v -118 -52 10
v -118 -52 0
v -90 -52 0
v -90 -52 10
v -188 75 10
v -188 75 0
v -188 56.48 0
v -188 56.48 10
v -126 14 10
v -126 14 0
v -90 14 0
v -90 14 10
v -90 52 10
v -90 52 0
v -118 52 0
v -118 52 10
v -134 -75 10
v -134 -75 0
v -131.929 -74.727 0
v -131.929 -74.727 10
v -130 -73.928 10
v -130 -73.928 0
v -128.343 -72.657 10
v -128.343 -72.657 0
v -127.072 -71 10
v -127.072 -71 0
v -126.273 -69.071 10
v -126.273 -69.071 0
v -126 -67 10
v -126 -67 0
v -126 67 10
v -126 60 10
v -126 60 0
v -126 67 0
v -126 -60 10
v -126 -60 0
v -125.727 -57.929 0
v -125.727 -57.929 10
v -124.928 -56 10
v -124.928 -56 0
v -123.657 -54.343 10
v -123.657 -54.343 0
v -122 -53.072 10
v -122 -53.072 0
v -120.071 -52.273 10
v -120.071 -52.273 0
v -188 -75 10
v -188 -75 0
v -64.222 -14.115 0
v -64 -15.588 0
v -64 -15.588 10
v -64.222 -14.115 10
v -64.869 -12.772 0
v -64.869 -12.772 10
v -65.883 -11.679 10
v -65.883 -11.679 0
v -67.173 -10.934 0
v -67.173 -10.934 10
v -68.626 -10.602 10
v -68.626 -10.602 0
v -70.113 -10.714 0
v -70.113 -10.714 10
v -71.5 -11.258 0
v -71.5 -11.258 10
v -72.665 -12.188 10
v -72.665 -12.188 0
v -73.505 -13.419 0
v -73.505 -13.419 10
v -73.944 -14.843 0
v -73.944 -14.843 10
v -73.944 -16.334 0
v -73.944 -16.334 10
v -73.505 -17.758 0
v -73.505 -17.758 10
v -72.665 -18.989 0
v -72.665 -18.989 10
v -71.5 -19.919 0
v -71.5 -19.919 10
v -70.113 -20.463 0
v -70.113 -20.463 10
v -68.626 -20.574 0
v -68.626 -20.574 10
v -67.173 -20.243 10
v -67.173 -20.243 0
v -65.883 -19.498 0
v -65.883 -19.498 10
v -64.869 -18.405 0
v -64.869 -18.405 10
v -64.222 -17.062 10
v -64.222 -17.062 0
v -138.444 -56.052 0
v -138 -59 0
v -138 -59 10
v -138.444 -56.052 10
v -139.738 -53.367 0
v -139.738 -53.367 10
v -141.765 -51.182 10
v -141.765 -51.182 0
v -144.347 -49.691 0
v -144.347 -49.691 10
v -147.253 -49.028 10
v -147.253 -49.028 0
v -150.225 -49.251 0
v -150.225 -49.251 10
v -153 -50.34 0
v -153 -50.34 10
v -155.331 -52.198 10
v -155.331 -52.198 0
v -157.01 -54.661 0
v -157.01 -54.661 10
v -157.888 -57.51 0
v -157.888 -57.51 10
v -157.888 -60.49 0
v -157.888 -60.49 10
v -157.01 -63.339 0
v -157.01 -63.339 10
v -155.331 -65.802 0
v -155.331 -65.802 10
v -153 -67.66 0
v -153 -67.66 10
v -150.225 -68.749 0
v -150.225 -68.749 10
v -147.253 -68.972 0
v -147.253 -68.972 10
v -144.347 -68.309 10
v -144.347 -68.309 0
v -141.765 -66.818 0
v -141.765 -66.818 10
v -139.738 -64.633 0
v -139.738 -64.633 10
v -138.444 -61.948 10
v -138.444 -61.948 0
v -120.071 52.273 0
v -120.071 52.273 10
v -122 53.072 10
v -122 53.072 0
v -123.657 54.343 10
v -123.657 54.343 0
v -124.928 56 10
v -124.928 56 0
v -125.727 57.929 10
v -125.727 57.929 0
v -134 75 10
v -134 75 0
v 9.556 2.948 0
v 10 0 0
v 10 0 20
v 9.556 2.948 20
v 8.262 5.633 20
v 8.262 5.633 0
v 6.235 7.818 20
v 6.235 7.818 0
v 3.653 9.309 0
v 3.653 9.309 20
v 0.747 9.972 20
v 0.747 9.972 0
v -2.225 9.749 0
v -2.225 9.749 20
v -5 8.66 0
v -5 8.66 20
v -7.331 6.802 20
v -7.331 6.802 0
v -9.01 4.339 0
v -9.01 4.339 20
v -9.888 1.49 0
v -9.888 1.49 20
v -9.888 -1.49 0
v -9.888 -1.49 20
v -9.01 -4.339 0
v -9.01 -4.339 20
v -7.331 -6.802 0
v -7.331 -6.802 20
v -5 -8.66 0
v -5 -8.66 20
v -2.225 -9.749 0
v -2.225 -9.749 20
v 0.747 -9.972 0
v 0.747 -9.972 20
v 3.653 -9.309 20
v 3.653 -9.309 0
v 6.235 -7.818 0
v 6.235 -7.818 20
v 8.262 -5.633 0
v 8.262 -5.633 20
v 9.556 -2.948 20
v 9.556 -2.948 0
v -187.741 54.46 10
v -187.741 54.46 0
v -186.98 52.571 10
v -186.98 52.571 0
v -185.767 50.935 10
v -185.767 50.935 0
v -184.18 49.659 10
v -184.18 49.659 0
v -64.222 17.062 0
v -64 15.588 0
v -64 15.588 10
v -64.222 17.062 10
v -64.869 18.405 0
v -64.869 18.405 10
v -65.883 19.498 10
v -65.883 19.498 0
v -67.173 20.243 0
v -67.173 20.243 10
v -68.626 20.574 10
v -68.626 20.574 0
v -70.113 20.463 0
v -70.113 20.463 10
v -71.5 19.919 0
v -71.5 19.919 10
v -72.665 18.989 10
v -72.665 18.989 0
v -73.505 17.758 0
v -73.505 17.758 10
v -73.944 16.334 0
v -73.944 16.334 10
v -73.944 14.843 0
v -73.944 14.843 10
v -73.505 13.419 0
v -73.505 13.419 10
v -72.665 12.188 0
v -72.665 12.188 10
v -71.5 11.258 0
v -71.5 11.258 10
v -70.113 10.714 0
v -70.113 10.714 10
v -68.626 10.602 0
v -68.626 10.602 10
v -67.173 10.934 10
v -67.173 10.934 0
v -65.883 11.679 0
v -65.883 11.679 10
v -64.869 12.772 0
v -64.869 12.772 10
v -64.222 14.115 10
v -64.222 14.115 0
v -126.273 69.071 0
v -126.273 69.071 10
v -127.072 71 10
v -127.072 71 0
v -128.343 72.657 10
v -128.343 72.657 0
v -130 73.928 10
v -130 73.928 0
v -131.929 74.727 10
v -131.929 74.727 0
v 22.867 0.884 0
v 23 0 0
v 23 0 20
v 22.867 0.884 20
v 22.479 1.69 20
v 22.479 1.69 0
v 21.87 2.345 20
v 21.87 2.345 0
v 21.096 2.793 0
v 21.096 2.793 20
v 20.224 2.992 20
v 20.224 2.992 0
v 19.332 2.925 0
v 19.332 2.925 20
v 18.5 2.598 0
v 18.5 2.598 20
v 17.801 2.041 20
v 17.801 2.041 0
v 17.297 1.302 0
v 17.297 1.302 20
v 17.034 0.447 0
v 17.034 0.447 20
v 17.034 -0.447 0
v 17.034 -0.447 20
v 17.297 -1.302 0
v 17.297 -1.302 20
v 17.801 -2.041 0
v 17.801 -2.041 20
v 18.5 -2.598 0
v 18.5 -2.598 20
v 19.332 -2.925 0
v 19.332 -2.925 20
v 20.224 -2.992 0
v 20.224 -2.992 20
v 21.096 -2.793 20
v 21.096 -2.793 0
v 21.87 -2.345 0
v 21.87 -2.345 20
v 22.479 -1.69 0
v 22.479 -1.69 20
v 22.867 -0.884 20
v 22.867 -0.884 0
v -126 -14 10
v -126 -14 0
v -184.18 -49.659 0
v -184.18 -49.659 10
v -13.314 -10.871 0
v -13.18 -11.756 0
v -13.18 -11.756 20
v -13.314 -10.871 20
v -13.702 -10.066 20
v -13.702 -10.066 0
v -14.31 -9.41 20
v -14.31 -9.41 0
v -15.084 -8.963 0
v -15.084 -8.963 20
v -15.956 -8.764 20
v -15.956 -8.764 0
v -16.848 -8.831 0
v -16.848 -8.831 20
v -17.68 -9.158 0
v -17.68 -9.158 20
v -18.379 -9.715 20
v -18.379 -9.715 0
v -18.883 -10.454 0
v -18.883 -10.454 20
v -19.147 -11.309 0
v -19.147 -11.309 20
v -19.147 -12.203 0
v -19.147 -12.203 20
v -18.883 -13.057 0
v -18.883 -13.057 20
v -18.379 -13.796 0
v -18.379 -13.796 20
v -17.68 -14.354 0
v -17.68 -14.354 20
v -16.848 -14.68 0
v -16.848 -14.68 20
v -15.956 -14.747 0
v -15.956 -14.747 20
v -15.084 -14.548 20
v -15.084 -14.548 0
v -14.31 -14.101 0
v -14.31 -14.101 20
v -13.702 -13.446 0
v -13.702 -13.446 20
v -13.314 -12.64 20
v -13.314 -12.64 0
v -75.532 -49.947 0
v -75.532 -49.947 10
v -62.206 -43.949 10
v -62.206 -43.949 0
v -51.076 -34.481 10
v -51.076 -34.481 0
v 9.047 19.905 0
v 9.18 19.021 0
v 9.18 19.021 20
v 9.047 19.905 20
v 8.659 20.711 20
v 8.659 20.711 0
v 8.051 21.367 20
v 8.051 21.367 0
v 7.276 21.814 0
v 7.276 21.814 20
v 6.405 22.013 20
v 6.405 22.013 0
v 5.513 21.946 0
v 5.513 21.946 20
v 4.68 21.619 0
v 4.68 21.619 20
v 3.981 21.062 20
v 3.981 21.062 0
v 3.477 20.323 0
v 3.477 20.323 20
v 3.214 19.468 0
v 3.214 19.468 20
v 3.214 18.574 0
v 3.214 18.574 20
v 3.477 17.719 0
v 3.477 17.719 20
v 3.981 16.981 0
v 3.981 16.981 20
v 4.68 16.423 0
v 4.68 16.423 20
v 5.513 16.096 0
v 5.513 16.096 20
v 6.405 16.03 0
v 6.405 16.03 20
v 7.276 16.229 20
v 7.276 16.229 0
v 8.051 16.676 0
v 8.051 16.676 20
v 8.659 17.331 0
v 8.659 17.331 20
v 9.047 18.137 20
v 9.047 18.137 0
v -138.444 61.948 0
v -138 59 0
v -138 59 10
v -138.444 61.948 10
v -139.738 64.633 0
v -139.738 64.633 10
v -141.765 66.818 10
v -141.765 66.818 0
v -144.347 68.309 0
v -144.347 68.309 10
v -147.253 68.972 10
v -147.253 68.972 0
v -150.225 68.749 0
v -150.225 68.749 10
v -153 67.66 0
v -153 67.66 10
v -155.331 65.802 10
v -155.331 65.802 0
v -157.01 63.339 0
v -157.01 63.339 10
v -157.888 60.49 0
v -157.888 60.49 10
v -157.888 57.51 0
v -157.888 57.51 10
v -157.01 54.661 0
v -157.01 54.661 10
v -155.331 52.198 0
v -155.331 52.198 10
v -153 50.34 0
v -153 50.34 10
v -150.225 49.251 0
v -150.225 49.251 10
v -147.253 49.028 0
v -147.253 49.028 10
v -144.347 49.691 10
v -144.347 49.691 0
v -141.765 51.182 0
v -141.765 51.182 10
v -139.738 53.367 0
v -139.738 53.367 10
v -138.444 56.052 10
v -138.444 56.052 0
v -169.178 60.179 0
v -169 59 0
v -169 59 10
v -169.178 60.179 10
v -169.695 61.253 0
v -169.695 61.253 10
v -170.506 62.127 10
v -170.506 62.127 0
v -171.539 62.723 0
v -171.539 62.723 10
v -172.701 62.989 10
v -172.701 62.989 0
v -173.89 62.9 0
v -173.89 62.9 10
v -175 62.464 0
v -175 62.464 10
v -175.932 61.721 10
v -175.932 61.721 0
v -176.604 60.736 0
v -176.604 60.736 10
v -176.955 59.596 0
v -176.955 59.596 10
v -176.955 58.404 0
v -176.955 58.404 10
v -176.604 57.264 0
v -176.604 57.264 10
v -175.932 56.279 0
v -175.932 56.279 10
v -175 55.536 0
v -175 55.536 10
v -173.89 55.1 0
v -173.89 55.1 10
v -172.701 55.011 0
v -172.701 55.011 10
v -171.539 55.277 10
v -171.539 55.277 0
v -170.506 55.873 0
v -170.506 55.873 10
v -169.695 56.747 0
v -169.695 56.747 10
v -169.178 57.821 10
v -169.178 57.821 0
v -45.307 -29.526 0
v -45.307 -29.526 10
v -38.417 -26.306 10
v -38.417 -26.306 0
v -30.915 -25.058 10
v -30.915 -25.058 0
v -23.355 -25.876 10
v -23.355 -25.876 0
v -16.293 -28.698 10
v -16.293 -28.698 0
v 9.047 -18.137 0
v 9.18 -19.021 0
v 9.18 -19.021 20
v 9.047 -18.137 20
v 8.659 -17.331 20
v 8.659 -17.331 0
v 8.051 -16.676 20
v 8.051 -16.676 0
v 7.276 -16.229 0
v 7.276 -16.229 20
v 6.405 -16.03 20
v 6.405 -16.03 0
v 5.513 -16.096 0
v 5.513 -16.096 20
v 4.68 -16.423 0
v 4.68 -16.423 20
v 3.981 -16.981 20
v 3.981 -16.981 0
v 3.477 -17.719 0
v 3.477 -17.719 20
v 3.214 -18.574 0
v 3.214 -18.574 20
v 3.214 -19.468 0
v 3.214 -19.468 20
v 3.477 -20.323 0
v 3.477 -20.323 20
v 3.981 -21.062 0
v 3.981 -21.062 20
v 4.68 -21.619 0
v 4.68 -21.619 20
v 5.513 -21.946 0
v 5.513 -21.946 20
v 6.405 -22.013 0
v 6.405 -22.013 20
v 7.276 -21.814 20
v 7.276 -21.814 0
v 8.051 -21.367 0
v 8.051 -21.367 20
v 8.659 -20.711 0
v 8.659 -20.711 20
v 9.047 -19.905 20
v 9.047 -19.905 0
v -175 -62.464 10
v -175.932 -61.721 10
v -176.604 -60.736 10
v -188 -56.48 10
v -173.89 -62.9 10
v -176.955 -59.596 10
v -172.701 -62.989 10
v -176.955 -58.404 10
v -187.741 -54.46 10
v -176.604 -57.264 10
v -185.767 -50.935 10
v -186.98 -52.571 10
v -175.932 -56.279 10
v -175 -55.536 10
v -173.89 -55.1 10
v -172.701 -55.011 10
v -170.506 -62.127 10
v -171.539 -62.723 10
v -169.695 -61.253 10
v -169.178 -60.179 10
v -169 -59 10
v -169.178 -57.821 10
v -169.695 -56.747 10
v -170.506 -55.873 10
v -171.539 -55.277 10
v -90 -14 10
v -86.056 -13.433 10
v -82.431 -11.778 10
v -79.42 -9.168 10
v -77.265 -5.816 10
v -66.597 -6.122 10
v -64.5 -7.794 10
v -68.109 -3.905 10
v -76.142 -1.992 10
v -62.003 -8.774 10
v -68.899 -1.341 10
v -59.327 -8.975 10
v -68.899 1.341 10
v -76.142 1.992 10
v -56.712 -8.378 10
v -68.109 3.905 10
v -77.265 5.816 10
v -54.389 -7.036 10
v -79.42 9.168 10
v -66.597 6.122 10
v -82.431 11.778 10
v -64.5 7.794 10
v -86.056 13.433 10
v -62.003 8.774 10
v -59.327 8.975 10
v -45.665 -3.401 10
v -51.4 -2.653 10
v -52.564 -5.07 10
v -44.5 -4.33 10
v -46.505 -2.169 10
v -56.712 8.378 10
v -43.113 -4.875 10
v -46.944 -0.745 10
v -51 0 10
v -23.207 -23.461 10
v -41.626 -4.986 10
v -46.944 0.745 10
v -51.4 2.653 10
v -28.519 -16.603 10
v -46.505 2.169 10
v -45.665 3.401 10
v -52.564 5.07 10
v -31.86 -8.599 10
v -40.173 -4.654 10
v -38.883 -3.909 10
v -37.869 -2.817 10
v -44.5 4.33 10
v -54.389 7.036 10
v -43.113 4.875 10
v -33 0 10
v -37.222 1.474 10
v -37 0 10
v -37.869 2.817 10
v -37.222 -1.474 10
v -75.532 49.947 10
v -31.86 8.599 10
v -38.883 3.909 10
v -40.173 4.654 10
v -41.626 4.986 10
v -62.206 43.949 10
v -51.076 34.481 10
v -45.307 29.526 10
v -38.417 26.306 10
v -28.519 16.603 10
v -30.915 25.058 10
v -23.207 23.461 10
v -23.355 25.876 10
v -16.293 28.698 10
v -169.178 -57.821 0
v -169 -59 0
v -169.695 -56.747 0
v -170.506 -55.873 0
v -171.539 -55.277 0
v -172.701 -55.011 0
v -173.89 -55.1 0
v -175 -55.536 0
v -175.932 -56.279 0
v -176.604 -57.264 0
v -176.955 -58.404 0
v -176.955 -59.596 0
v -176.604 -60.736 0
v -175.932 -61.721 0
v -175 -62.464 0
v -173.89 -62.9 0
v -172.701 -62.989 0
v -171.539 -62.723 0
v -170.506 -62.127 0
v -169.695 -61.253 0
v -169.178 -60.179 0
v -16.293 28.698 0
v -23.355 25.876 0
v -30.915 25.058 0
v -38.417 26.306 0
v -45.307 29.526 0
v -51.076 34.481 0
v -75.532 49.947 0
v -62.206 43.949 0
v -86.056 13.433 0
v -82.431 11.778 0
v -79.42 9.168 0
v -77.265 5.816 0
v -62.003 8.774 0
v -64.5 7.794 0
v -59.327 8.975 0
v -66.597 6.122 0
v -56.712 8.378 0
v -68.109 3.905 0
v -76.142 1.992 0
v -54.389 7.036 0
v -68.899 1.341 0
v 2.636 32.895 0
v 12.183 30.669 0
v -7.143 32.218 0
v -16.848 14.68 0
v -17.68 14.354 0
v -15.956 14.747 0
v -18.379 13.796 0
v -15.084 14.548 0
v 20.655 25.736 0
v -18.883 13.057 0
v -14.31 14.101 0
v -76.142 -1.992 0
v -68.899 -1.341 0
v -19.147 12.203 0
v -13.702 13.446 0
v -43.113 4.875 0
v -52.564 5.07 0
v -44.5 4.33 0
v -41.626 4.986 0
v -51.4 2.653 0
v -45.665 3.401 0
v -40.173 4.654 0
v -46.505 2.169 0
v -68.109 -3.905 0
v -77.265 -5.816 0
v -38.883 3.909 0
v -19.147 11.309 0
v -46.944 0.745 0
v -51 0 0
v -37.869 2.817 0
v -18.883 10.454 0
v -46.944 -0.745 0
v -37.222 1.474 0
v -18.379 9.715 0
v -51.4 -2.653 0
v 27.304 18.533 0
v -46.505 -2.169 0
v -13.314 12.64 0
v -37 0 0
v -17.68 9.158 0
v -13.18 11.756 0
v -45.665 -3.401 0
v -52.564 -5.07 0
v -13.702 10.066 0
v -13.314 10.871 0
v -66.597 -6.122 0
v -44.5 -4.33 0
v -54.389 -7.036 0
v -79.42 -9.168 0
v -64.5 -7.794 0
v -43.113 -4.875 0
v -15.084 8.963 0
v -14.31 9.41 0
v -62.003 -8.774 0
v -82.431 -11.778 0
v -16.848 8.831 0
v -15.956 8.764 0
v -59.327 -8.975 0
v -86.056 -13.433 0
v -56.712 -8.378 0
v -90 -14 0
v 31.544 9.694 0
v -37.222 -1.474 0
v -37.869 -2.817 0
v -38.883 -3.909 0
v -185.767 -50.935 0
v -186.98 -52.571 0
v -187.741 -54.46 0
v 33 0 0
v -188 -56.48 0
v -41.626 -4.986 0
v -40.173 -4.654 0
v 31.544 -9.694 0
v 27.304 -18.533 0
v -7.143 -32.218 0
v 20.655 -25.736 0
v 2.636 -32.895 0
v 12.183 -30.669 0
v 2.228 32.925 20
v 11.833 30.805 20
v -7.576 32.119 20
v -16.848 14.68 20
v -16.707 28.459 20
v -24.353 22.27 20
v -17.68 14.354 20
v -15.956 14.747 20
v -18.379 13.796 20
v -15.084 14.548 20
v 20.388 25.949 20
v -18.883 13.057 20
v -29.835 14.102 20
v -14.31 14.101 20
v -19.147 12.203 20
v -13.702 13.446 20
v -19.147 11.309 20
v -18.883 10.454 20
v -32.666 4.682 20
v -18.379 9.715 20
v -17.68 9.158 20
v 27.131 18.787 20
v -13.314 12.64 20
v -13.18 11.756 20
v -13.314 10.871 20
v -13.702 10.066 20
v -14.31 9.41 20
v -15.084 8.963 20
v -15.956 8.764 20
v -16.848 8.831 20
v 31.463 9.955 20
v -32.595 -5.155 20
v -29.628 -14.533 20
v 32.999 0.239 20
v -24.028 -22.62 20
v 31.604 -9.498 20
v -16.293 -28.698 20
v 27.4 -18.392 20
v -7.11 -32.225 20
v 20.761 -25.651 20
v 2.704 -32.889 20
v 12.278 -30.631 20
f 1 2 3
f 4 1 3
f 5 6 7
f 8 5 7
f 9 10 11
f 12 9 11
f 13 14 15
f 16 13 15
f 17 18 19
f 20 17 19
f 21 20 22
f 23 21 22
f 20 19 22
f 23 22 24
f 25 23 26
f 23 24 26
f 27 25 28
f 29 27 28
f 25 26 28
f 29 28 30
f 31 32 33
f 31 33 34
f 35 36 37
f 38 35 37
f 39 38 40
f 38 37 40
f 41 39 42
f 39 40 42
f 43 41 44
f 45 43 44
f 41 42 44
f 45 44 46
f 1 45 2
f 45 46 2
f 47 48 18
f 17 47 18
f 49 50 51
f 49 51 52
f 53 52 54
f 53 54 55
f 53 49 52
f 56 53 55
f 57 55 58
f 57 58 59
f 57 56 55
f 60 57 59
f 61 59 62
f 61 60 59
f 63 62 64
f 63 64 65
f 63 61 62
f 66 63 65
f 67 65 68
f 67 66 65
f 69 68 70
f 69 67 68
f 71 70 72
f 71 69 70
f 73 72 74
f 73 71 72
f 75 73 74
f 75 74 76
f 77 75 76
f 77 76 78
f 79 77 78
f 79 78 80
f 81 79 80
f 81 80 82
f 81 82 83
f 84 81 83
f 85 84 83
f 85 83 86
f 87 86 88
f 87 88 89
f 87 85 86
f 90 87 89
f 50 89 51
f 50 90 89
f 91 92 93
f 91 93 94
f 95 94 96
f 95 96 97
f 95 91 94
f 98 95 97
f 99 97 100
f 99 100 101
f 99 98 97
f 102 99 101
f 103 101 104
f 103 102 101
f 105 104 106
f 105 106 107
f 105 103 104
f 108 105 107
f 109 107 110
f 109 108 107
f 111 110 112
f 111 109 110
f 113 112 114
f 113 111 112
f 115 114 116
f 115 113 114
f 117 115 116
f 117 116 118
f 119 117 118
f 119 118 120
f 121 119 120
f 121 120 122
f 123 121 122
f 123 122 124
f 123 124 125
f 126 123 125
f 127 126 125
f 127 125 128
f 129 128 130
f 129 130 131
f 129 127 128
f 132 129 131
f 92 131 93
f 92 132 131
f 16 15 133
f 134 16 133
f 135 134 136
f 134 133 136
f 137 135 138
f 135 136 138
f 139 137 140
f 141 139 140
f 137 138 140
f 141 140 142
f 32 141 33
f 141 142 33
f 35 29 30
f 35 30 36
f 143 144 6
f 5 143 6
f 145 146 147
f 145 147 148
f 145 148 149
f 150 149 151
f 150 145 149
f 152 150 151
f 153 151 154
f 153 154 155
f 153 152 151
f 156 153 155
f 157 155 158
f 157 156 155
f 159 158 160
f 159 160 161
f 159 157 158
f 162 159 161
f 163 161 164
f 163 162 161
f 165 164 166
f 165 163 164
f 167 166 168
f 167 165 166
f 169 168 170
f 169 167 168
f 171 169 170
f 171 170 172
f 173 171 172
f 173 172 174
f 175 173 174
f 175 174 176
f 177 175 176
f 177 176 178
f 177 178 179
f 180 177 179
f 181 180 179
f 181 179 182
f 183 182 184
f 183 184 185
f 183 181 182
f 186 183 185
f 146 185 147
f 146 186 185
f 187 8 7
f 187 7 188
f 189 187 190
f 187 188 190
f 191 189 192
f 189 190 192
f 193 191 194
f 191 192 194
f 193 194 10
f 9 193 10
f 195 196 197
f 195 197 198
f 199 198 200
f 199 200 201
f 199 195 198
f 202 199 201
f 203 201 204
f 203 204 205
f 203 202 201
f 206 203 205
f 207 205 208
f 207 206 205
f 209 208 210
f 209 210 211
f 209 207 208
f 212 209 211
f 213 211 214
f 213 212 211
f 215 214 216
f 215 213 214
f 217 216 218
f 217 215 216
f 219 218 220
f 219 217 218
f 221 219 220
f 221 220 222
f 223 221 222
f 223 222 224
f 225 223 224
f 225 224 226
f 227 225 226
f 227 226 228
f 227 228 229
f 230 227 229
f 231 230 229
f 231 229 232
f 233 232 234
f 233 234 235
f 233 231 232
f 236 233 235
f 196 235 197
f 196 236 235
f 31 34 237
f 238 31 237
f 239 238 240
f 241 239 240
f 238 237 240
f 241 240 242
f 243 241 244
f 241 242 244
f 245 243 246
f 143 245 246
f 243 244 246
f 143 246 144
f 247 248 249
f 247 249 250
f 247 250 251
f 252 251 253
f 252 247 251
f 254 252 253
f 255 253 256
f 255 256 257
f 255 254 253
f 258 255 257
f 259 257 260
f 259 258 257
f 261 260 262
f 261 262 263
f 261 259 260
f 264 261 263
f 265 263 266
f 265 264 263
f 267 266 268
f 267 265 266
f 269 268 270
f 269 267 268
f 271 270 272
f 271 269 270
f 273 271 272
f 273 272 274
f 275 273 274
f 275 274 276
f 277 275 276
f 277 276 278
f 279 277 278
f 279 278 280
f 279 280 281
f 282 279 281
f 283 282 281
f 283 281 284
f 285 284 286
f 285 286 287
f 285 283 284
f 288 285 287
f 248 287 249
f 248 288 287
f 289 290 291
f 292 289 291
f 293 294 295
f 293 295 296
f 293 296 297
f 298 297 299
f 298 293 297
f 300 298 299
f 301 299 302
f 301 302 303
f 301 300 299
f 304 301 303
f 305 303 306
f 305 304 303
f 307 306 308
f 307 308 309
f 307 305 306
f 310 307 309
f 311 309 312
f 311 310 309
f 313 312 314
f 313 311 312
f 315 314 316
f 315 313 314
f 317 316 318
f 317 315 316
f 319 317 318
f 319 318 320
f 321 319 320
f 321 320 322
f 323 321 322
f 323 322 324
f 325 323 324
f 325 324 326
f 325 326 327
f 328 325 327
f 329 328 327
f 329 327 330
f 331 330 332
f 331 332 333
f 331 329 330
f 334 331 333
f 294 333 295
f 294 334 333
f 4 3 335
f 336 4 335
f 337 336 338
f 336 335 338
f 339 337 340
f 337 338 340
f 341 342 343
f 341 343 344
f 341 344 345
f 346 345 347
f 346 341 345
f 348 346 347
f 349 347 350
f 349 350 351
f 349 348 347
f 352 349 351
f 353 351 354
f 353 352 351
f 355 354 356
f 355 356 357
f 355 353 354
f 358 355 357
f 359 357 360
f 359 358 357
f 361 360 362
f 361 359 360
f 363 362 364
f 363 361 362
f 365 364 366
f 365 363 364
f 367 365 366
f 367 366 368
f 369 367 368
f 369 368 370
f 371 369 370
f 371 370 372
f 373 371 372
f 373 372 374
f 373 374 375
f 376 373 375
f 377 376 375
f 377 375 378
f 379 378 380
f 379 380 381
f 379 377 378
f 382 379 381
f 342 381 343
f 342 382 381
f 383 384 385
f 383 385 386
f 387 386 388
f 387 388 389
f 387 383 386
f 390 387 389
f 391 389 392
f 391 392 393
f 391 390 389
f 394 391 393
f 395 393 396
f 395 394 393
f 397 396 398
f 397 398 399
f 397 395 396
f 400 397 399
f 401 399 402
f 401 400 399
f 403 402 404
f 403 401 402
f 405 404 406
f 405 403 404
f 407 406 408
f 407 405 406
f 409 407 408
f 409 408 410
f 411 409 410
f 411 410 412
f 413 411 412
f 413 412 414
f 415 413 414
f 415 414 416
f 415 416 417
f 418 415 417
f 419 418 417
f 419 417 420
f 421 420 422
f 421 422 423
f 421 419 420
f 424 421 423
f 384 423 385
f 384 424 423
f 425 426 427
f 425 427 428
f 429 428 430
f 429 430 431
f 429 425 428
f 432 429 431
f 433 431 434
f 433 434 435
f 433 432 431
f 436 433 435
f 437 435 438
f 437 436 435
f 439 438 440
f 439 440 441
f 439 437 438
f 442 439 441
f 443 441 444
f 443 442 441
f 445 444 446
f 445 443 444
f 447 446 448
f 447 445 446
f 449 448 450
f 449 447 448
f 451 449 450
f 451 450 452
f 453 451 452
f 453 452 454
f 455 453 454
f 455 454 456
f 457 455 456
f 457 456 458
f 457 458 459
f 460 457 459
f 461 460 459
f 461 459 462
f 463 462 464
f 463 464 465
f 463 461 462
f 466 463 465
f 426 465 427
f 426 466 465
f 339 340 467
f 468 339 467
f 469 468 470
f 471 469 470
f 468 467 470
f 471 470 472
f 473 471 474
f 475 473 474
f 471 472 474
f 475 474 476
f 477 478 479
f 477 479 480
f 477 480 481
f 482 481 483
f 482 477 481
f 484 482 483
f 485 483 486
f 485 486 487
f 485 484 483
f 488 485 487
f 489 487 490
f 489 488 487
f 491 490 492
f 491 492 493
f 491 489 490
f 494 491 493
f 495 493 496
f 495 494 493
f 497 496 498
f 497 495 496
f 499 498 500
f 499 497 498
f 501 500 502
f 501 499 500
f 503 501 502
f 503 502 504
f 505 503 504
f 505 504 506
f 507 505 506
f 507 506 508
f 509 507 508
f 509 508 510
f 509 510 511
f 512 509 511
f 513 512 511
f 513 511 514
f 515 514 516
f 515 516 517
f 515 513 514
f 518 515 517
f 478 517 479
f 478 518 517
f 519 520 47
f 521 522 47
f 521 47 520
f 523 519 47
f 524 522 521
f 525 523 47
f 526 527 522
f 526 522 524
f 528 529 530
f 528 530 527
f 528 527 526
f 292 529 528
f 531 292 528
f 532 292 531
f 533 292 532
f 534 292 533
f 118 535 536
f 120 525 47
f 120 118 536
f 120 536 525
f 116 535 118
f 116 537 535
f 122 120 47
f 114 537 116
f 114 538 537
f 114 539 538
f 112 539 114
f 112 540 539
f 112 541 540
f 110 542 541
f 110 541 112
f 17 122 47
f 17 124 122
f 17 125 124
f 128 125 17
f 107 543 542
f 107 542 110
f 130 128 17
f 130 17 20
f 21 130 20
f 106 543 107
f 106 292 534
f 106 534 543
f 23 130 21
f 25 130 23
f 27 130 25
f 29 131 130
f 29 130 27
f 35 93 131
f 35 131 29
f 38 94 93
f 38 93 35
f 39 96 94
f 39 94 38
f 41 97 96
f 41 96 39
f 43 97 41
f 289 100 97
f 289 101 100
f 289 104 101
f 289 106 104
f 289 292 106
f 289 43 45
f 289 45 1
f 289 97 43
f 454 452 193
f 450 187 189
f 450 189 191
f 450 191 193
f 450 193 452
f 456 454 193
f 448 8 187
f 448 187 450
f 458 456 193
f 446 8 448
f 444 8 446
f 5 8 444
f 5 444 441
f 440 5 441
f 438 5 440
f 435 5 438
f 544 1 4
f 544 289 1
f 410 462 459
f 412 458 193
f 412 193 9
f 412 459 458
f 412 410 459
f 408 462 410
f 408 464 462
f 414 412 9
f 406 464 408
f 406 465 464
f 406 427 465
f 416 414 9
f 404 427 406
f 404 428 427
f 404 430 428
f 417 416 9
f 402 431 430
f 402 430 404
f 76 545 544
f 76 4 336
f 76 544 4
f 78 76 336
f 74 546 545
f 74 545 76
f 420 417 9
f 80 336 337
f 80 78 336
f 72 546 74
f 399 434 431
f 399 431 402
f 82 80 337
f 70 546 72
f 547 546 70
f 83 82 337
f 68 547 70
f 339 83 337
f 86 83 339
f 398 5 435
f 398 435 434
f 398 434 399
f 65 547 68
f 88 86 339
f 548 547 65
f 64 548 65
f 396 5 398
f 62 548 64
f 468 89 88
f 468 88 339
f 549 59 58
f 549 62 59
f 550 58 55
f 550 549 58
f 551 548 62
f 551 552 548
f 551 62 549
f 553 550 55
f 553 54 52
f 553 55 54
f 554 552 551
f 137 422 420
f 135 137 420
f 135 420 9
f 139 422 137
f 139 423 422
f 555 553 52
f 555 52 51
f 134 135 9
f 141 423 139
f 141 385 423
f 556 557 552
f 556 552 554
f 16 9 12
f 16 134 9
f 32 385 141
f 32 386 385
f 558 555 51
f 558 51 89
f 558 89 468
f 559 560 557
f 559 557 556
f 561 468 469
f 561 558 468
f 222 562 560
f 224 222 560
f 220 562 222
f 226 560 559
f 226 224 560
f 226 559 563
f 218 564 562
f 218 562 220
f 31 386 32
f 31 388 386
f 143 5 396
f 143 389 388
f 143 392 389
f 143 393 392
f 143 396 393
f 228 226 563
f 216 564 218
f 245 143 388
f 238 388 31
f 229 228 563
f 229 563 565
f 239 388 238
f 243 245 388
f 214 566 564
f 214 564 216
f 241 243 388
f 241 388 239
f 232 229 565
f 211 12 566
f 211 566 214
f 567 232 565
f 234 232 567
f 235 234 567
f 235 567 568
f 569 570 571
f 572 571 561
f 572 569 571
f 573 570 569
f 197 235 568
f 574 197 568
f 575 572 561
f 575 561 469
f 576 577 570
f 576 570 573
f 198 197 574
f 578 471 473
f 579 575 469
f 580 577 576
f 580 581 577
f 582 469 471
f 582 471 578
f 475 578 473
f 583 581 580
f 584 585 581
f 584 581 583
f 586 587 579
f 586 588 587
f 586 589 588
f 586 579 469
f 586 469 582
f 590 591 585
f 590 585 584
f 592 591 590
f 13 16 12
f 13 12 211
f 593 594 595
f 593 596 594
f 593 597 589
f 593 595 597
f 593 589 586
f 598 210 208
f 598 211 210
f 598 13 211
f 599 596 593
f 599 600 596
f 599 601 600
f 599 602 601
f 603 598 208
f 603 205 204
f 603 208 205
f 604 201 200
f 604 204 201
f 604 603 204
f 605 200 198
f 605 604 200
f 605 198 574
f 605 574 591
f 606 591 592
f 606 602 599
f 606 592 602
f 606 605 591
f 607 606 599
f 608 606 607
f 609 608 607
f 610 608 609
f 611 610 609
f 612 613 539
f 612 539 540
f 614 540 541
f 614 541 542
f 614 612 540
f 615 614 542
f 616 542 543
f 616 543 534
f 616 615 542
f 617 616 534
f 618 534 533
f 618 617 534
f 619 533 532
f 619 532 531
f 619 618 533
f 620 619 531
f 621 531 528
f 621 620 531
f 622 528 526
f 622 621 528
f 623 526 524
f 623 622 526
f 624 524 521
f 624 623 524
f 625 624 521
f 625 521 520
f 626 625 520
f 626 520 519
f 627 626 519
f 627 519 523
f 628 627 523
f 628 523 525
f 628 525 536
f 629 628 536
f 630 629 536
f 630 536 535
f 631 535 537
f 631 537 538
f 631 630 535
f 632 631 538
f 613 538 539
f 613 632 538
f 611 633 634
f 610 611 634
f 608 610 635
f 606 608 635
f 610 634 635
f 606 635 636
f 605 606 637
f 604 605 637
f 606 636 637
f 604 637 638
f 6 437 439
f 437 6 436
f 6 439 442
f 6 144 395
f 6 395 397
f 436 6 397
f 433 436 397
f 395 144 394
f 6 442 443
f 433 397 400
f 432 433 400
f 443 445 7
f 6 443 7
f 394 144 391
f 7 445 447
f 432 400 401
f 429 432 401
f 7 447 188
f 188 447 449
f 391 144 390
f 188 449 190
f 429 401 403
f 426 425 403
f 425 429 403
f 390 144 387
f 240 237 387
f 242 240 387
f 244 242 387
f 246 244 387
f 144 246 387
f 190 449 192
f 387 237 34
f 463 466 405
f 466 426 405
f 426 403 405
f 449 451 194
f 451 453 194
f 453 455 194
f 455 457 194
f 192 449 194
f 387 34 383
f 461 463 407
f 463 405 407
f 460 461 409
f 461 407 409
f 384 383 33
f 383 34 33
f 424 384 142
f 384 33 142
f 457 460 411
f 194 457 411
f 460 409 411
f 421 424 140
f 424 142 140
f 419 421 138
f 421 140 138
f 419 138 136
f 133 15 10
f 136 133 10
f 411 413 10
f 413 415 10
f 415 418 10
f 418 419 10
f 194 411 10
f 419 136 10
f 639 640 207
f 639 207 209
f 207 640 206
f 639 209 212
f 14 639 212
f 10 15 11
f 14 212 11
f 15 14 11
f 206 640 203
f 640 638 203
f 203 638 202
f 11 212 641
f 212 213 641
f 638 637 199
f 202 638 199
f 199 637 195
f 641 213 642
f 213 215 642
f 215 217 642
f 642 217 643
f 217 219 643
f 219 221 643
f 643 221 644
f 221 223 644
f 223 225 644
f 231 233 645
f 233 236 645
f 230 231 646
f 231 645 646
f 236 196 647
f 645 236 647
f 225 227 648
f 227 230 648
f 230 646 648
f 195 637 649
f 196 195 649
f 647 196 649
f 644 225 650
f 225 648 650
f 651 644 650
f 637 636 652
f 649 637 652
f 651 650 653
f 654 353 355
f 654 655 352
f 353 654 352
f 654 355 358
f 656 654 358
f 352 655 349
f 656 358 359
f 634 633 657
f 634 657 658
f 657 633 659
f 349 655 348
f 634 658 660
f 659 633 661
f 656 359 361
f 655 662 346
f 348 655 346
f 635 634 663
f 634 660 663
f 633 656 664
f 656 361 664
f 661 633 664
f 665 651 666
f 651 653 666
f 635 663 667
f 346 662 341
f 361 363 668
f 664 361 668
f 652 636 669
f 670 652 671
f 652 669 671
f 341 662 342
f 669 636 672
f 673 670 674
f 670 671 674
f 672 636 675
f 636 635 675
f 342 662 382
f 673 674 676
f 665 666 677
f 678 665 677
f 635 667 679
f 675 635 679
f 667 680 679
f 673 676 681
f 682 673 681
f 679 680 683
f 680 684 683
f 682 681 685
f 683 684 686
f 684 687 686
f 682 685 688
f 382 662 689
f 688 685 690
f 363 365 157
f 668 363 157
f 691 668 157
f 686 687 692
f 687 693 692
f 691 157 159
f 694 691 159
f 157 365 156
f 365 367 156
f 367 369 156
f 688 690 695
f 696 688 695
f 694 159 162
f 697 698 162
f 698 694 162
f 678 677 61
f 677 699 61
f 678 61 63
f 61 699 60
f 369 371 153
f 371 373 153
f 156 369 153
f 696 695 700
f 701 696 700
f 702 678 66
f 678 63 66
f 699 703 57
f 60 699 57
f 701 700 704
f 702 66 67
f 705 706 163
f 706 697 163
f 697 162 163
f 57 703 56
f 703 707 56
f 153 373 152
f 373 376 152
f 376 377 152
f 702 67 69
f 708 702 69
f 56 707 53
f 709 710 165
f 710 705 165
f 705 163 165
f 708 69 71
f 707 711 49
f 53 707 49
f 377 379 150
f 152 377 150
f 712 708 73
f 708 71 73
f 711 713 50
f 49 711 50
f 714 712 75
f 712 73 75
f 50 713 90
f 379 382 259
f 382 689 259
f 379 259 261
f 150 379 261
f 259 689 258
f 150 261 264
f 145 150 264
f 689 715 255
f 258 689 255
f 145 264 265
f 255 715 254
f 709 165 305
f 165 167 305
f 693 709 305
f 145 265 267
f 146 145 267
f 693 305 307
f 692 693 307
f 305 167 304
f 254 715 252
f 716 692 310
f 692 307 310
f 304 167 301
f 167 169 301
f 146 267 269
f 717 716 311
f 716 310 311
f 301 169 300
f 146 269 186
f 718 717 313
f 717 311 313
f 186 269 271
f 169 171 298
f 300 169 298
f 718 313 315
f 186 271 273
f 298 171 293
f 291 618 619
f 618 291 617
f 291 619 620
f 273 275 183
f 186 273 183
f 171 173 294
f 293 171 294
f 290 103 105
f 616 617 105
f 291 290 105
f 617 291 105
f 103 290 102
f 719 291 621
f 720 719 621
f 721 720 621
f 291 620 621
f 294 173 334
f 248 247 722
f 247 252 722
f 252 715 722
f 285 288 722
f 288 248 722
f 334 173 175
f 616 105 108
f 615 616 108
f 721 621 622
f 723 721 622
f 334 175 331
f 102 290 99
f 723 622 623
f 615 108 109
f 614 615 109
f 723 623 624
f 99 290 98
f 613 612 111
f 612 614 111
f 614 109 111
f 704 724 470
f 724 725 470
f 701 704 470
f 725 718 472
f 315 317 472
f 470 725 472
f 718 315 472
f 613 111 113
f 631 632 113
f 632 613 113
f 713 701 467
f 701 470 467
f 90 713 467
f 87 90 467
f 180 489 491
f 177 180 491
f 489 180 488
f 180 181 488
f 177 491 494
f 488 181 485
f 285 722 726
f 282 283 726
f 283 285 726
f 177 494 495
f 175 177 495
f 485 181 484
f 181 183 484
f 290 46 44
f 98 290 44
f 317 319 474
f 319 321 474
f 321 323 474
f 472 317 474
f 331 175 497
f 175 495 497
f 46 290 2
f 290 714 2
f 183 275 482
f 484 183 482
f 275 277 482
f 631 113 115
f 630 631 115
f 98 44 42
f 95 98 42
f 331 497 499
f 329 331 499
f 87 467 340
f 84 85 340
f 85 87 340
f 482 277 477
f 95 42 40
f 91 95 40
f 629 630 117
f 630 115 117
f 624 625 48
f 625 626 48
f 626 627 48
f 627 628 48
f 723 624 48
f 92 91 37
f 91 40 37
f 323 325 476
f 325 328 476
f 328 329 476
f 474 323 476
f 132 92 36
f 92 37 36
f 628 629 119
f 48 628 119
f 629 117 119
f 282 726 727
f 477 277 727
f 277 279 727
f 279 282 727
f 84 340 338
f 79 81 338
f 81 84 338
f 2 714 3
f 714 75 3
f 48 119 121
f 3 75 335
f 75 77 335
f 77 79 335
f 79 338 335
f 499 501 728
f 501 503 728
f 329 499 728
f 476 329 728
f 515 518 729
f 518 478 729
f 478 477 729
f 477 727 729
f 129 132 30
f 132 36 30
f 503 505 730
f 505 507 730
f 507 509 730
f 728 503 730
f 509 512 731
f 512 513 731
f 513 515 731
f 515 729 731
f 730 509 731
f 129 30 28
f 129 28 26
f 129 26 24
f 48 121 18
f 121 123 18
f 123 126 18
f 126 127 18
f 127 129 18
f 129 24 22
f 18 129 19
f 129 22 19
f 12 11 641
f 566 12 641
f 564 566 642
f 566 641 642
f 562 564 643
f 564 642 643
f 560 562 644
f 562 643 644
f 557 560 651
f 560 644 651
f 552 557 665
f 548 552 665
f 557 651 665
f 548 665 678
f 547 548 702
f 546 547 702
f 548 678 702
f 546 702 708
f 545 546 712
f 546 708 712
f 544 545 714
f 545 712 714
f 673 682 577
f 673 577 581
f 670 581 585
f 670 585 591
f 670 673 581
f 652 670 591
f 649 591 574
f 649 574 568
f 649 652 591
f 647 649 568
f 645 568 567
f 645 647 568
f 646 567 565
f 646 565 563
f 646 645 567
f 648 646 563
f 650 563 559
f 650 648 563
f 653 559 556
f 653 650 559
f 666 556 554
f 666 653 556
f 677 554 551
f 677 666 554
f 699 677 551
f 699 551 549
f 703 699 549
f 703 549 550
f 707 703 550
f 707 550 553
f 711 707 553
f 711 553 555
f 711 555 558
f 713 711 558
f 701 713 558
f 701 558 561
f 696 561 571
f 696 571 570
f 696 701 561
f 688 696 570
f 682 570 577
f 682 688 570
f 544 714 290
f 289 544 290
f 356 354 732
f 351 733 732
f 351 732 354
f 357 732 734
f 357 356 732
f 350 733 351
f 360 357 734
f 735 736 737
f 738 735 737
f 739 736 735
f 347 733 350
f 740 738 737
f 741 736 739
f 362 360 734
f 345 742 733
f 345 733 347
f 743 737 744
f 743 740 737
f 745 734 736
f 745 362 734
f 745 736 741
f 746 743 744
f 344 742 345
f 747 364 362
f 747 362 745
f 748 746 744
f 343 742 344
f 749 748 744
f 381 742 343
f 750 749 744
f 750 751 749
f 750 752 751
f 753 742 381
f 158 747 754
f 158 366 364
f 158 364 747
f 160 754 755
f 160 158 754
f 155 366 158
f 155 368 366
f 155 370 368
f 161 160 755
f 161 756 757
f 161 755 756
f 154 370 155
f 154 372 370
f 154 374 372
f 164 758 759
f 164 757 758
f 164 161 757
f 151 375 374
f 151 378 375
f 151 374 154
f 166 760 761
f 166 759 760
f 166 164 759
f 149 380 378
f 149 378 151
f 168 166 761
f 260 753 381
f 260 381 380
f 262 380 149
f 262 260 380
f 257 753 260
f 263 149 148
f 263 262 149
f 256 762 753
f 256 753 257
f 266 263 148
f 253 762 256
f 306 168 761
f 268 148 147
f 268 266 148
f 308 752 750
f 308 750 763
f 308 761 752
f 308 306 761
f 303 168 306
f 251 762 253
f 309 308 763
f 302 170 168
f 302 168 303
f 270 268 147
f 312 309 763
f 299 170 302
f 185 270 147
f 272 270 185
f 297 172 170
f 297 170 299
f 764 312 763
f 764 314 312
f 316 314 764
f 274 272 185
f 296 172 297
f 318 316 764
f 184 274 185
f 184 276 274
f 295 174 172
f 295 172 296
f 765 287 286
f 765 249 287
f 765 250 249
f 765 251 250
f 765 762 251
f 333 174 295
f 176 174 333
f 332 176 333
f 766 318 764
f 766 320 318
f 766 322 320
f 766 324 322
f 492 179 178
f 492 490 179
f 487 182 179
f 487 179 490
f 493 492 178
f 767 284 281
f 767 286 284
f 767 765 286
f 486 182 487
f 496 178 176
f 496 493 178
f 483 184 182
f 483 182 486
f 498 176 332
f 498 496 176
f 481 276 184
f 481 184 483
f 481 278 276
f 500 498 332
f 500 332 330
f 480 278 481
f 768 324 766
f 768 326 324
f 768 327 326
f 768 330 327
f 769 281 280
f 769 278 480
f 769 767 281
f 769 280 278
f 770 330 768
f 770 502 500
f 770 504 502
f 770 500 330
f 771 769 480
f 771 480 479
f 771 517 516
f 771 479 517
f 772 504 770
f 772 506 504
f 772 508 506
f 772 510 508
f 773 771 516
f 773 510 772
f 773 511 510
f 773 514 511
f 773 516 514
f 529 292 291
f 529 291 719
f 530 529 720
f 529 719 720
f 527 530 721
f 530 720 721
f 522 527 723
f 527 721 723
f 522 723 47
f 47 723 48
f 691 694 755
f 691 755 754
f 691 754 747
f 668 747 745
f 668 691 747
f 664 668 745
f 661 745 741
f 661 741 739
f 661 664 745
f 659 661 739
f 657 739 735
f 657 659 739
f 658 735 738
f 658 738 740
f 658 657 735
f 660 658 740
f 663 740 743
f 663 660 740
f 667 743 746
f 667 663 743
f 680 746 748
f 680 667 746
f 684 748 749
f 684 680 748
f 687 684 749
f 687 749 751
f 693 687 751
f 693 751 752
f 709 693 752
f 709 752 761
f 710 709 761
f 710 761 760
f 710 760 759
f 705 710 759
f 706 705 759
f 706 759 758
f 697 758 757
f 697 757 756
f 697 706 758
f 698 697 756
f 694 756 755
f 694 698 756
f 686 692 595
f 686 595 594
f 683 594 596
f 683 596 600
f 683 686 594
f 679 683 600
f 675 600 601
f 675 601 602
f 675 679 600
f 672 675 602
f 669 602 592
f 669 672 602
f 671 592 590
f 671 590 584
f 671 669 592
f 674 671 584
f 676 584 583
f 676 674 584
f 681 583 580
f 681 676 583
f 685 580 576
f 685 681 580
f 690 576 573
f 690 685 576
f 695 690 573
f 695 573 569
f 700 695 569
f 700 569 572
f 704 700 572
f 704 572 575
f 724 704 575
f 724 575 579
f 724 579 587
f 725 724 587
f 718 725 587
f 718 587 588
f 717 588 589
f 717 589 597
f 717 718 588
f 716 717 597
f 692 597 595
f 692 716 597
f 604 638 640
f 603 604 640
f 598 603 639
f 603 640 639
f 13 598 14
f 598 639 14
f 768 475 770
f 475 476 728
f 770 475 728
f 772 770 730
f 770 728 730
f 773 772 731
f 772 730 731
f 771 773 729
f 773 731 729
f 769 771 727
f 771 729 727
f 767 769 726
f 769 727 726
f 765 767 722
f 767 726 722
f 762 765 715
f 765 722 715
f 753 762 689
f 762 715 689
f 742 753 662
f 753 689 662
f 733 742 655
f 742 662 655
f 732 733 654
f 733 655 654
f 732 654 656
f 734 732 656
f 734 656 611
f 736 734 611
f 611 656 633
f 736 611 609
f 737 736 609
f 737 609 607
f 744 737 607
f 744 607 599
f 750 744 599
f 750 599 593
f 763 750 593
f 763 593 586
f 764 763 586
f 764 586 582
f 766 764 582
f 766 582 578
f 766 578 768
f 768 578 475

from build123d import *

# Parameters (mm, degrees)
SKETCH_1_R      = 4
SKETCH_1_R_2    = 10
SKETCH_1_R_3    = 5
SKETCH_1_R_4    = 9
EXTRUDE_1_DEPTH = 10
SKETCH_1_3_R    = 3
SKETCH_1_3_R_2  = 10
EXTRUDE_2_DEPTH = 20


with BuildPart() as part:
    # Эскиз1 → Бобышка-Вытянуть1 (new body)
    with BuildSketch(Plane.XY):
        with BuildLine():
            Line((-134, 75), (-188, 75))
            Line((-188, 75), (-188, 56.479823981))
            ThreePointArc((-188, 56.479823981), (-186.980113599, 52.571113945), (-184.180496463, 49.659013961))
            Line((-184.180496463, 49.659013961), (-126, 14))
            Line((-126, 14), (-90, 14))
            ThreePointArc((-90, 14), (-76, 0), (-90, -14))
            Line((-90, -14), (-126, -14))
            Line((-126, -14), (-184.180496463, -49.659013961))
            ThreePointArc((-184.180496463, -49.659013961), (-186.980113599, -52.571113945), (-188, -56.479823981))
            Line((-188, -56.479823981), (-188, -75))
            Line((-188, -75), (-134, -75))
            ThreePointArc((-134, -75), (-128.343145751, -72.656854249), (-126, -67))
            Line((-126, -67), (-126, -60))
            ThreePointArc((-126, -60), (-123.656854249, -54.343145751), (-118, -52))
            Line((-118, -52), (-90, -52))
            ThreePointArc((-90, -52), (-68.657428628, -47.418294436), (-51.075833333, -34.480563355))
            ThreePointArc((-51.075833333, -34.480563355), (-34.708861379, -25.426163433), (-16.292622951, -28.697568493))
            ThreePointArc((-16.292622951, -28.697568493), (-33, 0), (-16.292622951, 28.697568493))
            ThreePointArc((-16.292622951, 28.697568493), (-34.708861379, 25.426163433), (-51.075833333, 34.480563355))
            ThreePointArc((-51.075833333, 34.480563355), (-68.657428628, 47.418294436), (-90, 52))
            Line((-90, 52), (-118, 52))
            ThreePointArc((-118, 52), (-123.656854249, 54.343145751), (-126, 60))
            Line((-126, 60), (-126, 67))
            ThreePointArc((-126, 67), (-128.343145751, 72.656854249), (-134, 75))
        make_face()
        with Locations((-173, -59)):
            Circle(SKETCH_1_R, mode=Mode.SUBTRACT)
        with Locations((-148, -59)):
            Circle(SKETCH_1_R_2, mode=Mode.SUBTRACT)
        with Locations((-69, -15.588457268)):
            Circle(SKETCH_1_R_3, mode=Mode.SUBTRACT)
        with Locations((-173, 59)):
            Circle(SKETCH_1_R, mode=Mode.SUBTRACT)
        with Locations((-148, 59)):
            Circle(SKETCH_1_R_2, mode=Mode.SUBTRACT)
        with Locations((-60, 0)):
            Circle(SKETCH_1_R_4, mode=Mode.SUBTRACT)
        with Locations((-69, 15.588457268)):
            Circle(SKETCH_1_R_3, mode=Mode.SUBTRACT)
        with Locations((-42, 0)):
            Circle(SKETCH_1_R_3, mode=Mode.SUBTRACT)
    extrude(amount=EXTRUDE_1_DEPTH)

    # Эскиз1<3> → Бобышка-Вытянуть2 (add)
    with BuildSketch(Plane.XY):
        with BuildLine():
            ThreePointArc((33, 0), (16.603364759, 28.518910896), (-16.292622951, 28.697568493))
            ThreePointArc((-16.292622951, 28.697568493), (-33, 0), (-16.292622951, -28.697568493))
            ThreePointArc((-16.292622951, -28.697568493), (16.603364759, -28.518910896), (33, 0))
        make_face()
        with Locations((6.180339887, -19.021130326)):
            Circle(SKETCH_1_3_R, mode=Mode.SUBTRACT)
        with Locations((-16.180339887, -11.755705046)):
            Circle(SKETCH_1_3_R, mode=Mode.SUBTRACT)
        Circle(SKETCH_1_3_R_2, mode=Mode.SUBTRACT)
        with Locations((-16.180339887, 11.755705046)):
            Circle(SKETCH_1_3_R, mode=Mode.SUBTRACT)
        with Locations((20, 0)):
            Circle(SKETCH_1_3_R, mode=Mode.SUBTRACT)
        with Locations((6.180339887, 19.021130326)):
            Circle(SKETCH_1_3_R, mode=Mode.SUBTRACT)
    extrude(amount=EXTRUDE_2_DEPTH)


solid = part.part
